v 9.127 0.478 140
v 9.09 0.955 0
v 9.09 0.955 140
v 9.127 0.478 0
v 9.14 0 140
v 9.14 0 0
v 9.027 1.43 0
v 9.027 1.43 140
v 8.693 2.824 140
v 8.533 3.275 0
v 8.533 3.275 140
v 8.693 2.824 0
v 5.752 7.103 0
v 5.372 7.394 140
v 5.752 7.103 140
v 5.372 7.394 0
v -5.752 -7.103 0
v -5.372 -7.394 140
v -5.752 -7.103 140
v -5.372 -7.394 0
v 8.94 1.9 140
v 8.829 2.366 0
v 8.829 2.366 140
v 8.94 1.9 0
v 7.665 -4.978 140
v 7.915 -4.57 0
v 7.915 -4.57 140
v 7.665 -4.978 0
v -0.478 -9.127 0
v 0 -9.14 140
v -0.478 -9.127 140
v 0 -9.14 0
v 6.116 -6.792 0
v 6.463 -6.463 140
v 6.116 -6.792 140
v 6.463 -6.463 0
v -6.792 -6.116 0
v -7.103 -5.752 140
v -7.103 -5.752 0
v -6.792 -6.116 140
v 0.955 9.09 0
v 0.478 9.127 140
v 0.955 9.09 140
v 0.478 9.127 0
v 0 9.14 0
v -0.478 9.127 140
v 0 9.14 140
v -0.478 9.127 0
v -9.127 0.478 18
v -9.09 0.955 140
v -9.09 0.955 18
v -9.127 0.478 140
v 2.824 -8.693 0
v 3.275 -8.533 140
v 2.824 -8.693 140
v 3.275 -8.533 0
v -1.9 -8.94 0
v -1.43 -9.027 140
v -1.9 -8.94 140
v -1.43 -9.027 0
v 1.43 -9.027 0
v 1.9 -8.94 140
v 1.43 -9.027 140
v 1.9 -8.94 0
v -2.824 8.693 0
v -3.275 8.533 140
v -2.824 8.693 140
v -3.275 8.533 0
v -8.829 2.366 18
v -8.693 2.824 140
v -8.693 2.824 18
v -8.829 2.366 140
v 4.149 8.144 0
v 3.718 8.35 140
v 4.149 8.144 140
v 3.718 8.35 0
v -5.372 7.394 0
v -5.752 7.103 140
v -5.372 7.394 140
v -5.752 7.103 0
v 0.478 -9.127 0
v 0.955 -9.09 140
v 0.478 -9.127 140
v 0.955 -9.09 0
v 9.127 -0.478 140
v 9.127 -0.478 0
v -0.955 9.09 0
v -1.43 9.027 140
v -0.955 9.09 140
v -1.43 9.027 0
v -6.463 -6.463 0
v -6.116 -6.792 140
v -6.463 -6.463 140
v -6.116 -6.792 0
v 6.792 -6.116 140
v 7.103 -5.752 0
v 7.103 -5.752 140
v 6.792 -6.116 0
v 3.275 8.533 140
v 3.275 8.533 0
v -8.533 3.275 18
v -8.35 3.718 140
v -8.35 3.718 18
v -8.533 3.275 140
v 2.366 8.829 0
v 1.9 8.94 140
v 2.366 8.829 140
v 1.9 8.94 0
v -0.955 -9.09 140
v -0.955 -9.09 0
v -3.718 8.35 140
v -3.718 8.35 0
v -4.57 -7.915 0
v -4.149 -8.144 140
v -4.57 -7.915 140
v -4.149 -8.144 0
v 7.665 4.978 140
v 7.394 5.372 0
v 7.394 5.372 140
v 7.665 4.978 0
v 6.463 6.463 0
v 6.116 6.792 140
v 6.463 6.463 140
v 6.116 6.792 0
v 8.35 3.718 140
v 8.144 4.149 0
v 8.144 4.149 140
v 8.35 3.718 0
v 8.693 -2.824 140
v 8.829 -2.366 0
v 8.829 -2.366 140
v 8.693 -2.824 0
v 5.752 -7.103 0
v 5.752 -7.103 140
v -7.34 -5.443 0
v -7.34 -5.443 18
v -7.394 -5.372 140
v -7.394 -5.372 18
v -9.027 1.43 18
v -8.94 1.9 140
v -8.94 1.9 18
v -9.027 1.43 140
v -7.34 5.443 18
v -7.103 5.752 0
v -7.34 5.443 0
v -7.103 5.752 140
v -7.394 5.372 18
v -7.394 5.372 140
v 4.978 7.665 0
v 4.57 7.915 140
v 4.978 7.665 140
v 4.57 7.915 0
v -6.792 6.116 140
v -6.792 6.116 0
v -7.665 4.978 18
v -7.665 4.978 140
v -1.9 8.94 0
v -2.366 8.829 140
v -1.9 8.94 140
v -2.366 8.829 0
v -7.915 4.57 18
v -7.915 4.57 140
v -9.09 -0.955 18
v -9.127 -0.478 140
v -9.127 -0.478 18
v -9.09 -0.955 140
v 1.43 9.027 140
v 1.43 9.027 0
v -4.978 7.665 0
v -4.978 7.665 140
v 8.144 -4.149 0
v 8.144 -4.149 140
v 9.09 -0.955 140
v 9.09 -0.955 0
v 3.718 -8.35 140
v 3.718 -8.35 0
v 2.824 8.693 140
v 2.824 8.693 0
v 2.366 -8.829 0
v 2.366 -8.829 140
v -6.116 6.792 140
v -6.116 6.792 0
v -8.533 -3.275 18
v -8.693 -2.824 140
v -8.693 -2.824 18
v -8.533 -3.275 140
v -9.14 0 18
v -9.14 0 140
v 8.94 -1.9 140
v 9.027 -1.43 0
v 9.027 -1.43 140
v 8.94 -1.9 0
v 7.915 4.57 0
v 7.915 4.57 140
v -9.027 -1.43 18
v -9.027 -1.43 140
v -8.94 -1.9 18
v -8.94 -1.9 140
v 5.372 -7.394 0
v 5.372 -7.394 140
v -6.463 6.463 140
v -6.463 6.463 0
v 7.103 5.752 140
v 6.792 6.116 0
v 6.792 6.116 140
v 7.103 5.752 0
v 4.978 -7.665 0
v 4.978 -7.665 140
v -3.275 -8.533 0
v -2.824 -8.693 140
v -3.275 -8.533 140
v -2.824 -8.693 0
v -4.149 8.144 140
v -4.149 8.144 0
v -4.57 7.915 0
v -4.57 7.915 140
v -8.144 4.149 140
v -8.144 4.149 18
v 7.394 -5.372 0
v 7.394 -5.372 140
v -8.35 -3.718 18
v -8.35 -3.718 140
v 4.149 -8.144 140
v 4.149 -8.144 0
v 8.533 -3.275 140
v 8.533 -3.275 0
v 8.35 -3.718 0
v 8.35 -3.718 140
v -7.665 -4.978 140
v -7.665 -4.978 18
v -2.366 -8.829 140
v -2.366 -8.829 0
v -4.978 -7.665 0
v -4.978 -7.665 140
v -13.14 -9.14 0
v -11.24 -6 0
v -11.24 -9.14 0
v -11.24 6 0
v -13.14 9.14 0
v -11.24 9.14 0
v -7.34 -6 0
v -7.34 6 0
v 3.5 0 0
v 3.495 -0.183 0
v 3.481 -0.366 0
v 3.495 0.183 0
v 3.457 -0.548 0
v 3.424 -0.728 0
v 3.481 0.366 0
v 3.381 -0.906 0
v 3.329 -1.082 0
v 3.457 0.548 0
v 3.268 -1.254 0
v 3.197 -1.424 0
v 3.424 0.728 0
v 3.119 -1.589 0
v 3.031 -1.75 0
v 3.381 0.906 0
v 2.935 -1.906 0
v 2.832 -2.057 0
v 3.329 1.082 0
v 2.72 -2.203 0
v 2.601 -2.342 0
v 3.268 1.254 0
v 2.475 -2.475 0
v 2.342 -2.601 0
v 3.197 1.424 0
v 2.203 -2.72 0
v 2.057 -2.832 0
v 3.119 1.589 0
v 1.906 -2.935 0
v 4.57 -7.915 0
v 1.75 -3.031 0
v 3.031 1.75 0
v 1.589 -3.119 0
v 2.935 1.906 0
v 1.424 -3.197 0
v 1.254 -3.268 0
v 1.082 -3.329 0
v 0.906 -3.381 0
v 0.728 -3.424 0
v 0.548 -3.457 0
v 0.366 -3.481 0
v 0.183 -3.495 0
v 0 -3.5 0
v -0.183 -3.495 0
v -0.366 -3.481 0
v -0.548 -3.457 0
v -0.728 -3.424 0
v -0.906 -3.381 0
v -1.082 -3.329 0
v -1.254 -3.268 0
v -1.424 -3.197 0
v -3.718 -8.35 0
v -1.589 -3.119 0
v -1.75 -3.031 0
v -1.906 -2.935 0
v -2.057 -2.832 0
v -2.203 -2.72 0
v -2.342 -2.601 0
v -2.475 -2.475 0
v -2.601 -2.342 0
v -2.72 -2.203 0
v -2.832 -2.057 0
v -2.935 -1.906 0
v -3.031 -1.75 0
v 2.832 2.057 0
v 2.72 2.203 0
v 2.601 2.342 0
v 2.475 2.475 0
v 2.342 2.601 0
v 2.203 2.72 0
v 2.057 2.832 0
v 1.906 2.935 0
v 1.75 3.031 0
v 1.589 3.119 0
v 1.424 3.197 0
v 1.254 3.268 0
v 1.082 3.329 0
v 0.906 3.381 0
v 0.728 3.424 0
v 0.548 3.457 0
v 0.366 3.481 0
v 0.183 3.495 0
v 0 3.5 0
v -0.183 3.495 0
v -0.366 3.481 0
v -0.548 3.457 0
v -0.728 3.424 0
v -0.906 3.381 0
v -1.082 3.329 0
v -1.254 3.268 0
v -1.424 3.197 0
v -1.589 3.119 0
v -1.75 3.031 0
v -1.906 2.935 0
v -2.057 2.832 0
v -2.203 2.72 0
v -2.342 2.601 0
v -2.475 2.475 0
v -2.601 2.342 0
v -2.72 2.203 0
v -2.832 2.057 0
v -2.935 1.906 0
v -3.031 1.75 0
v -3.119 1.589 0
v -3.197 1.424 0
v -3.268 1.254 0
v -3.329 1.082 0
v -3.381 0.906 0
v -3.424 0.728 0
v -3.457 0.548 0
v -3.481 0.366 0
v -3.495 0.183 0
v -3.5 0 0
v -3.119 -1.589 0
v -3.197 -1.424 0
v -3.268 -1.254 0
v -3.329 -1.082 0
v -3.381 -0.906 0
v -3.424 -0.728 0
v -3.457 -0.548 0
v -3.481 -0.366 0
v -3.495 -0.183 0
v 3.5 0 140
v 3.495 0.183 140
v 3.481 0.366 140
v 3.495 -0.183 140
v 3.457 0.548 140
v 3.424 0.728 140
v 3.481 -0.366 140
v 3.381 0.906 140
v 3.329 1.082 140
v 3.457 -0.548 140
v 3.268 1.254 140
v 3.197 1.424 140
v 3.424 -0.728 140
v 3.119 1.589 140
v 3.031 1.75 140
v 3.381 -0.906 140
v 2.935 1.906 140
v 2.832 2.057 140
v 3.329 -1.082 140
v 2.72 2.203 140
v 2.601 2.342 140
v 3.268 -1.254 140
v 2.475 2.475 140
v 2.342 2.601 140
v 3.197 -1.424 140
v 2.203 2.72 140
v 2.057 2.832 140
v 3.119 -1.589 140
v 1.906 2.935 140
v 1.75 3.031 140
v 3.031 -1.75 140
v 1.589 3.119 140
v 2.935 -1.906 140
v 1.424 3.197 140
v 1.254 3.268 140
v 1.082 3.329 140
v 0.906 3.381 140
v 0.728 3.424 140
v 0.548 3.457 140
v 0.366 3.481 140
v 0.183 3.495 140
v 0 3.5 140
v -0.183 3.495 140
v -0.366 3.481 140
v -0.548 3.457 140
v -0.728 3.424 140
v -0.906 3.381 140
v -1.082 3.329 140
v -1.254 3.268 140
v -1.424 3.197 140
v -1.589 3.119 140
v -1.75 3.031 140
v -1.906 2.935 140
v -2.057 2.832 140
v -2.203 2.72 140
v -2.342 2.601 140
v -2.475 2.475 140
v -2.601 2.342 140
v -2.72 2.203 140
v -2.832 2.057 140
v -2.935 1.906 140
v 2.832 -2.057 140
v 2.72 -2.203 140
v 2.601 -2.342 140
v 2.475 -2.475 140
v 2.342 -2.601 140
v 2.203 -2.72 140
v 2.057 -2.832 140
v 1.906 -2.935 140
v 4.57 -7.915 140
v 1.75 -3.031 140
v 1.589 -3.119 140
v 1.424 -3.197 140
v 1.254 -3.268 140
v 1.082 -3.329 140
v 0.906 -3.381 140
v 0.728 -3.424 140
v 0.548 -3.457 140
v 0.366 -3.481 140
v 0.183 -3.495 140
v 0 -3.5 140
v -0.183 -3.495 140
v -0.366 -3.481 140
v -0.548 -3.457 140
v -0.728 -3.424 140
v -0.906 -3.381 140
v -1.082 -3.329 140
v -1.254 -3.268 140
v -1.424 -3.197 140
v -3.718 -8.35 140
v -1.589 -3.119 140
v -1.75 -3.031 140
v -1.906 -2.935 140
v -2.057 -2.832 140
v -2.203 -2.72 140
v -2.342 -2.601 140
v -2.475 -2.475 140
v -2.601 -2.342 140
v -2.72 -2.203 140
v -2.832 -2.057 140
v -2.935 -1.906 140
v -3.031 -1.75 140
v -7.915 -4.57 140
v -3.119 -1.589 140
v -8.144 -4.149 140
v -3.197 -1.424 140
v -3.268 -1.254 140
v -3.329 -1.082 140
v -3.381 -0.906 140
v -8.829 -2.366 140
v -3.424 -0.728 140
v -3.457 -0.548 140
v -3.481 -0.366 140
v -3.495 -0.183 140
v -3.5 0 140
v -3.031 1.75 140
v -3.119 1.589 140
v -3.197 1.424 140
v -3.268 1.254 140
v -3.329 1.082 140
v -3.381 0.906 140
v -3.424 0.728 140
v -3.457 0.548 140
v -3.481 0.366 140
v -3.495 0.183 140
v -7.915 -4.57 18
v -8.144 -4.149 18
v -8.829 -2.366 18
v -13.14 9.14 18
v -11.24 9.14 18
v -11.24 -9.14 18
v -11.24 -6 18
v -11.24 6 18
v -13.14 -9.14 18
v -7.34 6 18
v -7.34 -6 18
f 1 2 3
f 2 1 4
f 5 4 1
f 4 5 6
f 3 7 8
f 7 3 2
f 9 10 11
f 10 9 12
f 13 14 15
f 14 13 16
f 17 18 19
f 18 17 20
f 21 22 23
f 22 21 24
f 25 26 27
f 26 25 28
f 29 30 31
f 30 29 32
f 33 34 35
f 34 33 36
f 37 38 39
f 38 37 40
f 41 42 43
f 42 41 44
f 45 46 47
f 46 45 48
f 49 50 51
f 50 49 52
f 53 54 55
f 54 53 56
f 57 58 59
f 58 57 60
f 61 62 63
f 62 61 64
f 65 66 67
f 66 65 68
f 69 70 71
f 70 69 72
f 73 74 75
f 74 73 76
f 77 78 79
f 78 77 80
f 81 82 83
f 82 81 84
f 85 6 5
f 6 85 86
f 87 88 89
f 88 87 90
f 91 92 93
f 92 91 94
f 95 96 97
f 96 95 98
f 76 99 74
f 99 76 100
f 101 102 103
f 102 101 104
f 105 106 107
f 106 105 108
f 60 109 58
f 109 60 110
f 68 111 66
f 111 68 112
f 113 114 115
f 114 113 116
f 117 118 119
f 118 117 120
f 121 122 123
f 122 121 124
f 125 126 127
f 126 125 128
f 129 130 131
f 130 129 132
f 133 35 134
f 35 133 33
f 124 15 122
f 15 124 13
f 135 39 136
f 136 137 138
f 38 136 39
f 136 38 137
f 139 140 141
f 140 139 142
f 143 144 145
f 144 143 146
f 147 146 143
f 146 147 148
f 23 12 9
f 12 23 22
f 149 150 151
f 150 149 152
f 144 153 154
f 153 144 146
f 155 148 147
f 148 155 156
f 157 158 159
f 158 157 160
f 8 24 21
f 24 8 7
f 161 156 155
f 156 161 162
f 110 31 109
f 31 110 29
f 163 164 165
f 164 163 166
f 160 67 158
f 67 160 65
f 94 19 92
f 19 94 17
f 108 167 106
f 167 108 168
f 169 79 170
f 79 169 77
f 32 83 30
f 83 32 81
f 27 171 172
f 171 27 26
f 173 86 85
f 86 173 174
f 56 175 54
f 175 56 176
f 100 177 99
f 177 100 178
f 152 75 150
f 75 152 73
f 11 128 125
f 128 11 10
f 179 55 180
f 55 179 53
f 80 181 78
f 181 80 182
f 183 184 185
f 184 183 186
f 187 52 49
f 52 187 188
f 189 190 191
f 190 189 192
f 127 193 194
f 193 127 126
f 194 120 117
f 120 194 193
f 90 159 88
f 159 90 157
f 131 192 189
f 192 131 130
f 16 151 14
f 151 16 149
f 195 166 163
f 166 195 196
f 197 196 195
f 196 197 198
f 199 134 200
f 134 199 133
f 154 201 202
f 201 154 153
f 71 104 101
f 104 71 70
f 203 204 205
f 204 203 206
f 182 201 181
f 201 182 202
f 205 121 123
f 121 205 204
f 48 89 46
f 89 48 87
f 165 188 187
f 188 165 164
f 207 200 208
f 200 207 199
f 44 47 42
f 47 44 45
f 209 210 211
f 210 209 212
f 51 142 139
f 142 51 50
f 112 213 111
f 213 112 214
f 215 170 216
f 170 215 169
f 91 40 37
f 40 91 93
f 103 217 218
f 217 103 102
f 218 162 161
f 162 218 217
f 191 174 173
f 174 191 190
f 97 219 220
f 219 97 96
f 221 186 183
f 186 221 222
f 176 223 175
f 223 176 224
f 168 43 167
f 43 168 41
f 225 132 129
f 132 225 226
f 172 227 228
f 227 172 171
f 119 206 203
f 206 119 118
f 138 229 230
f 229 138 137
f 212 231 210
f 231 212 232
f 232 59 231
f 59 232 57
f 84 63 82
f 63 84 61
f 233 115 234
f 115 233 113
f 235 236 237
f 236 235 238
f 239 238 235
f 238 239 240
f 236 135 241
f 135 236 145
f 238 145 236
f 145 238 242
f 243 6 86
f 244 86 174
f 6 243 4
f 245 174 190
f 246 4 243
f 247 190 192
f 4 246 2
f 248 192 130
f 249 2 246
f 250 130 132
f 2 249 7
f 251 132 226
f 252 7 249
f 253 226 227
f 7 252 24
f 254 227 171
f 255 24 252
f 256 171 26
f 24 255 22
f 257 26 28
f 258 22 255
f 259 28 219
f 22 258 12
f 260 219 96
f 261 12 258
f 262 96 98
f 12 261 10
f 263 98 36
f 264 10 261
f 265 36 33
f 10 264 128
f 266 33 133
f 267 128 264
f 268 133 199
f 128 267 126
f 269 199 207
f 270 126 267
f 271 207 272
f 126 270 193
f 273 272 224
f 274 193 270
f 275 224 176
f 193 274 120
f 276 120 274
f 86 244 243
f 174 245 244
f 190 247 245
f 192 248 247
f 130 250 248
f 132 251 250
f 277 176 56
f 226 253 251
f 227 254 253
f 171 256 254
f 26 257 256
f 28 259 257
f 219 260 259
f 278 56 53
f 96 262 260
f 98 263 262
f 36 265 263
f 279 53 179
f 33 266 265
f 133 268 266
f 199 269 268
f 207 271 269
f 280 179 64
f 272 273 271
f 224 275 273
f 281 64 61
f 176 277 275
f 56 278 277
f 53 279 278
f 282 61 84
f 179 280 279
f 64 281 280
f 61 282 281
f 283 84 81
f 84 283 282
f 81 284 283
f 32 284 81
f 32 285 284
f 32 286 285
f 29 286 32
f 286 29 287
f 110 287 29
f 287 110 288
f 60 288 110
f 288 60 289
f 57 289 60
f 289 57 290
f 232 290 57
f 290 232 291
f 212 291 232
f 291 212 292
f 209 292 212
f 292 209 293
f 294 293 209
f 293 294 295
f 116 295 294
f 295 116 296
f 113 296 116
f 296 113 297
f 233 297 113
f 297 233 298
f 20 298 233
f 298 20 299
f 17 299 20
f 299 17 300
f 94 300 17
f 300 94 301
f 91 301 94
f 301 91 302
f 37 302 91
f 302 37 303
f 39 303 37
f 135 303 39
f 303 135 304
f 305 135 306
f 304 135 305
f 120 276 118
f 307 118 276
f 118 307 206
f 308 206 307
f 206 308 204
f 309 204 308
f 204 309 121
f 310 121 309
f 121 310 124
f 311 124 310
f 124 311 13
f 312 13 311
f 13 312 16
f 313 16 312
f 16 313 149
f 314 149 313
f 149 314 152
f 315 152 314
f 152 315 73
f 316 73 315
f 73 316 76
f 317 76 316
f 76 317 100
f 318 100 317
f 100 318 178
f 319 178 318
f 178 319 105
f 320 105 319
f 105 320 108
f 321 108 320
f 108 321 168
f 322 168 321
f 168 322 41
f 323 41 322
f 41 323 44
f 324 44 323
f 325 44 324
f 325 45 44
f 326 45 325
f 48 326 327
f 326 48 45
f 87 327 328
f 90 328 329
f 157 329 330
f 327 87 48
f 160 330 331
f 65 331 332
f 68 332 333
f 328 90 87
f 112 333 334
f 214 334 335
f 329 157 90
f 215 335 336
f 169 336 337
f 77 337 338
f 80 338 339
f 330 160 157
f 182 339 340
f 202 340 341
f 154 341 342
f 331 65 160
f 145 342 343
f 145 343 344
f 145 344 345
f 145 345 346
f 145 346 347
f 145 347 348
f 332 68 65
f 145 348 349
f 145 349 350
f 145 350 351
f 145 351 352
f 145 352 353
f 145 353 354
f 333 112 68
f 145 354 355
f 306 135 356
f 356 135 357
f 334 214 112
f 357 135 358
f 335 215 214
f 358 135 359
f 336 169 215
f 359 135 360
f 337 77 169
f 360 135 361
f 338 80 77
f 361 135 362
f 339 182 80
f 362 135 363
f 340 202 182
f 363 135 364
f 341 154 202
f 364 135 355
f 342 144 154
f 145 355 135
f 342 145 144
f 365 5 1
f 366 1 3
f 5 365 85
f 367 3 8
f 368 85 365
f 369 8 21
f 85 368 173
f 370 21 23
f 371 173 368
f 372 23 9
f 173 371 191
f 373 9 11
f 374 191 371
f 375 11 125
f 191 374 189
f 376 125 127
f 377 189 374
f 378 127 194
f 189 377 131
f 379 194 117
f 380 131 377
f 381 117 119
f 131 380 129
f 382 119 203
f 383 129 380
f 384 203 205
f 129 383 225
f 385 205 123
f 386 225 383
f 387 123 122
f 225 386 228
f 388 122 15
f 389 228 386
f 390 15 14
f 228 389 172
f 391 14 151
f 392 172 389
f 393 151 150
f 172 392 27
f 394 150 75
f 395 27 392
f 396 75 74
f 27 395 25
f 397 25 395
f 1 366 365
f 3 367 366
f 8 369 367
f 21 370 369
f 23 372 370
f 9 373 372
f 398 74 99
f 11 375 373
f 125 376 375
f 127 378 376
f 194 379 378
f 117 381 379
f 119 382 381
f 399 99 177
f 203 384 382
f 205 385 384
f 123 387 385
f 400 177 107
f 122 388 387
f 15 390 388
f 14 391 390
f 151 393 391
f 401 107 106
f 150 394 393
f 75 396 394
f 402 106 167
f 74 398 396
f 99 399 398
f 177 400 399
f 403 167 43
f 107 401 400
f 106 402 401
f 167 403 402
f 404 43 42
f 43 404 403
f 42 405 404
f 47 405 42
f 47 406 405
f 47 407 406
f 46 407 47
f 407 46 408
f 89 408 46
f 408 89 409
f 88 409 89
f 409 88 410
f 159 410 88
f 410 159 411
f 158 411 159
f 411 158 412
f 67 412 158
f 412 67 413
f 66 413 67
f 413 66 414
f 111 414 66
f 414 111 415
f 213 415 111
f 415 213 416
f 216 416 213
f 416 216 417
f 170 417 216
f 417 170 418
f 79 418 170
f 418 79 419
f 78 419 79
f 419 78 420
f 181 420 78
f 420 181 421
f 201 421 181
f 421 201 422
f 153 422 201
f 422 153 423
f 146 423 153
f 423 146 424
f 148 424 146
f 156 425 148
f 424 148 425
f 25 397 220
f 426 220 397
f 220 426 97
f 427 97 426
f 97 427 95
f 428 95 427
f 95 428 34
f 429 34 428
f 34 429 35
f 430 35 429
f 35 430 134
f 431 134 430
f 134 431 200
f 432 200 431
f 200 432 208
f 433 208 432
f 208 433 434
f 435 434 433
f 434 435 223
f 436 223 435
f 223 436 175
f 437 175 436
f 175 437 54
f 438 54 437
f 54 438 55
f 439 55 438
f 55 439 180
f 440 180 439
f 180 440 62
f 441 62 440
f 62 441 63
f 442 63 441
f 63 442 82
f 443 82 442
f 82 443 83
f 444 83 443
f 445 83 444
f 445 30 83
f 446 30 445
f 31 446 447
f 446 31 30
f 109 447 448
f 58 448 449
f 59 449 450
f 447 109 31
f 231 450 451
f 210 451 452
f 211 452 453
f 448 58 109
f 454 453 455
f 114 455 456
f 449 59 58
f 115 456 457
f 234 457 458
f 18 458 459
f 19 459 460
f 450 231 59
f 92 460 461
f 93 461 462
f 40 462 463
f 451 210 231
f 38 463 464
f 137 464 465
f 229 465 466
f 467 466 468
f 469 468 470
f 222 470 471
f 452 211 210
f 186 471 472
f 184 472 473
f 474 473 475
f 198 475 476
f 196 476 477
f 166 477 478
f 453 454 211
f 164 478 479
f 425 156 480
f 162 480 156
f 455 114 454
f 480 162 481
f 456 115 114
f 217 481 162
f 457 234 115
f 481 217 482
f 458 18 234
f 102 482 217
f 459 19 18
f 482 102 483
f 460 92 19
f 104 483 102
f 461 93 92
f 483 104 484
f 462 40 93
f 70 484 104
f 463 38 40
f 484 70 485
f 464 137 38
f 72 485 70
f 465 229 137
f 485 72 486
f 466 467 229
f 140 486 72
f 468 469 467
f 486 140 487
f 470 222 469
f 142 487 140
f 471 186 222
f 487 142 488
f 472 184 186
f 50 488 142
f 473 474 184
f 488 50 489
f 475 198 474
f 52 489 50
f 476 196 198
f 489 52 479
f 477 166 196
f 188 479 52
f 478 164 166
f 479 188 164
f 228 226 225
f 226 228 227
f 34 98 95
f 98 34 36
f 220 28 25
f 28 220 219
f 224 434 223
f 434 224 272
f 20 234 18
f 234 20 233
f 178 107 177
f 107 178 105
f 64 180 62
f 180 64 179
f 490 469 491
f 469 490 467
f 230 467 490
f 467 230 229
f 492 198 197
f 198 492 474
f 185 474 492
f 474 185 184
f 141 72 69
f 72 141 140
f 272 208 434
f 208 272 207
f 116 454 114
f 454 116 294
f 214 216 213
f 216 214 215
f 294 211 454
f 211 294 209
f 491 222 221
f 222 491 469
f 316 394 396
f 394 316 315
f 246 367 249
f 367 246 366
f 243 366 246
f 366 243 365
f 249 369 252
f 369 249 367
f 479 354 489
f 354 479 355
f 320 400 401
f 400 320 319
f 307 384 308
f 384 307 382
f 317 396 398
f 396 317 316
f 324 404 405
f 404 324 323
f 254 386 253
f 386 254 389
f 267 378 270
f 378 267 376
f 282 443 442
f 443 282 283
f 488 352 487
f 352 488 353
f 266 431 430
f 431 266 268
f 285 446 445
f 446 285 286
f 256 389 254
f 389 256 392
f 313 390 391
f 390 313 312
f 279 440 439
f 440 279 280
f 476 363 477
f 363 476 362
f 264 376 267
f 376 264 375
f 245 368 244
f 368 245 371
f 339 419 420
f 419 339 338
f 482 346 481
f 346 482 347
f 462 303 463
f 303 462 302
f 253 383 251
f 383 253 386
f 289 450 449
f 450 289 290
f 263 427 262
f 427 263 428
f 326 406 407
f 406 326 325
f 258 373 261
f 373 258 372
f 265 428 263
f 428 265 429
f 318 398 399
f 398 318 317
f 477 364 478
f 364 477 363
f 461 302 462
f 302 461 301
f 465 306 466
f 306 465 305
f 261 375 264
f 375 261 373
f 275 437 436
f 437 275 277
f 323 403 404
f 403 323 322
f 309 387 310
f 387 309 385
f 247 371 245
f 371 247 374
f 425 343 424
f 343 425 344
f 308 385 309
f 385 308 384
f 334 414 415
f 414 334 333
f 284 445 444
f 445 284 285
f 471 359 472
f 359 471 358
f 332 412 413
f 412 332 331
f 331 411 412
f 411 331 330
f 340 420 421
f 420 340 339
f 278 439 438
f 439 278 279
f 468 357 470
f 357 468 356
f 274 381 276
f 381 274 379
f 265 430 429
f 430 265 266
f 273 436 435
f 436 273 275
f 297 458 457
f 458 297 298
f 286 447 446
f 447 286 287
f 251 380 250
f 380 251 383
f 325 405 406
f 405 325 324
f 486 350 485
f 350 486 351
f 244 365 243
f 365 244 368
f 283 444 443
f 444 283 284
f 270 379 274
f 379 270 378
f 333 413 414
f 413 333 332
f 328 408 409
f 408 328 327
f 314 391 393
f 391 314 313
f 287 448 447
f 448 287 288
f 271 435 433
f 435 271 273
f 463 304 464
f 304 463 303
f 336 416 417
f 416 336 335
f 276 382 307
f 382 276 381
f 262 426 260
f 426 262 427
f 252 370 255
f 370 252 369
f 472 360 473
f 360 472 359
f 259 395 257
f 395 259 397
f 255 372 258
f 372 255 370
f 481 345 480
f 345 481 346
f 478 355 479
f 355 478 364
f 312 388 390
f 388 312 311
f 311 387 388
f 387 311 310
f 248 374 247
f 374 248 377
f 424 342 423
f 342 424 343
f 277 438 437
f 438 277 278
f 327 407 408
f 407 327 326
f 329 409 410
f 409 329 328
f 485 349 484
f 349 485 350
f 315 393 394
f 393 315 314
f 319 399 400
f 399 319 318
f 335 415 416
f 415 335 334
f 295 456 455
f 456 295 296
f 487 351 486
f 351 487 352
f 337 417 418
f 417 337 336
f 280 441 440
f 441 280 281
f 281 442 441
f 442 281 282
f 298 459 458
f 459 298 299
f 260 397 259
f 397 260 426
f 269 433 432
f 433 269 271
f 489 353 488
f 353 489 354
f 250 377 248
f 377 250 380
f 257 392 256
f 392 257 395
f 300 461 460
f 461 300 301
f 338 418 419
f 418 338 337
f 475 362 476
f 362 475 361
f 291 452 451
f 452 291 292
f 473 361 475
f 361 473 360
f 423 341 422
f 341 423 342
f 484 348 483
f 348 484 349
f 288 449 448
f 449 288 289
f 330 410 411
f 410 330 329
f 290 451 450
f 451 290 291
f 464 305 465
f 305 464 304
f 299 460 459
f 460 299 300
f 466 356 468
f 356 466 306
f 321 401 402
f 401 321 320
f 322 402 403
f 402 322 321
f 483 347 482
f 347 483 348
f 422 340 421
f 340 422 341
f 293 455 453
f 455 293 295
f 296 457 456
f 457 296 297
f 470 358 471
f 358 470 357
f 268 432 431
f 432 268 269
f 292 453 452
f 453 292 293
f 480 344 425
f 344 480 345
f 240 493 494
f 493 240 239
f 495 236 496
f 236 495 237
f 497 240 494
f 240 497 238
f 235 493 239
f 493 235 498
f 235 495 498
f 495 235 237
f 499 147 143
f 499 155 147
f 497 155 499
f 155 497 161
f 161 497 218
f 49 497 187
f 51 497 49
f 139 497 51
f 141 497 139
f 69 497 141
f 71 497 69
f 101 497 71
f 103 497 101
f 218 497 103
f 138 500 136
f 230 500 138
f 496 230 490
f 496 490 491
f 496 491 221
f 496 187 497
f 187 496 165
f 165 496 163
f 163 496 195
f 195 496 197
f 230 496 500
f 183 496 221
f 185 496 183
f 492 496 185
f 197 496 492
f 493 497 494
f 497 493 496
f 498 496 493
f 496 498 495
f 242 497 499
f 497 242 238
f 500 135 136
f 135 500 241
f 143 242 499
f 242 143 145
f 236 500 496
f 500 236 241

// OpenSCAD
// file: myTools.scad
module tube (r = 0, d = 0, l = 0, 
            thick = 0, 
            bCentered = true, 
            taper_pct = 0, 
            circlip = false) // r=radius d=dia l=length 
{
    assert( r != 0 || d != 0, "specify one of radius or diameter");
    assert( l != 0 , "tube: need length 'l' to be non zero");
    assert( thick != 0, "wall thickness cannot be zero");

    punch = $preview ? .2 : 0; // stop funny view artifact

    dia = r ? r * 2 : d;

    od = ((thick > 0) ? dia + thick * 2 : dia);
    id = (thick > 0) ? dia             : dia  + thick *2; 

    
    
    if (thick > 0)
        echo ("tube\tMIN id = ", id, "od = ", od, "wall = ", thick, "center= ", bCentered);
    else
        echo ("tube\tMAX od = ", od, "id = ", id, "wall = ", thick, "center= ", bCentered);

    echo ("tube\tHeigth = ", l);
        
    if (taper_pct != 0)
    {
        echo ("tube\t*** OD expanded by ", taper_pct, "%, : bottom od = ", od * (1. +taper_pct/100), "top od = ", od);
    }
    
    assert(dia || dia < 0, "tube : missing r or d ");
    
    // if taper_pct specified, the base will always be closest to 0,0,0
    translate([ 0, 0, taper_pct == 0 ? 0: bCentered ? l/2:l  ])
    rotate([0, taper_pct == 0 ? 0 : 180, 0 ])

    difference()
    {
        // make a reese's cup
        {
            color("YELLOW", .3)
            linear_extrude(height= l, scale = 1 + taper_pct/100)
                difference()
                {
                    circle(d = od);
                    circle(d = .5);
                }
        }
    
     // hollow out reessed cup
     color("GREEN")
     translate([0, 0, -punch/2])
     linear_extrude(height= l+ punch*2, $fn=100)
     {
        circle(d = id);
        if (circlip) #square([1 + punch, od ]);
     }
    
    }
}
//==============================================================================
        
module abox (dims, 
            thick = 0, 
            bCentered = true, 
            round_out = 0, 
            round_in = 0, 
            bSolid = false,
            bHollow = false,
            elevator = 0)   // move bottom up by X
{
    punch = $preview ? .1 : 0; // stop funny view artifact
    
    assert(thick != 0, "Thick must be specified. +=outside dim, -= inside dims");
    assert(dims.z > thick, "wall thickness too large for depth of box");

    wall2 = abs(thick) * 2; // 2 walls in each direction
    wall = wall2 / 2;
    
    // box either grows inward (thick < 0) or outward (thick > 0)  from dims
    fat = dims + [ wall2, wall2, wall];
    thin = dims - [ wall2, wall2, wall];
    
    offset = (thick > 0 && bCentered == false) ? wall : 0;
    
    //echo ("abox : adjusting x,y,z by ", offset, " to move origin from  center to 0,0,0");
    translate( [ bCentered ? 0 : dims.x /2 + offset, bCentered ? 0 : dims.y /2 + offset, bCentered ? 0 : dims.z /2 + offset/2]) 
    {
        if (thick > 0)
        {   
            // wall grows outwards from users dim
            echo ("making a box, MAX INSIDE dim = ", dims, "a wall=", thick, "mm ... max outside = ", fat, " mm");
        }
        else
        {
            // wall grows inward from users dime
            echo ("making a box, MAX OUTSIDE dim = ", dims, "a wall=", thick, "mm ... min inside = ", thin, " mm");
        }
        
        // linear extrude alway works in the positive x/y plane an goes upward.
        // after calc, re-center about 0,0,0 where a bCentered cube would be
        
        translate([ 0, 0, thick > 0  ? -fat.z/2 : -dims.z/2 ])
        difference()
        {
            echo ("round_out = ", round_out);

            // MAKE SOLID BOX --------------------------------------
            router_outside = round_out ? round_out : 0;
            x = thick > 0  ? fat.x - router_outside : dims.x - router_outside;
            y = thick > 0  ? fat.y - router_outside : dims.y - router_outside;


            // MAKE PUCHNED INSIDE
            // using 'offset' it will add r on all dimensions, then round., 
            // so now you have fatter perimeter than you started with :(
            //  but at least the corners are round.
            
            // Compensate by shrinking dimension by r, 
            // and then by calling offset, offset will then add it back

            color("YELLOW", .2)

            linear_extrude(thick > 0  ? fat.z : dims.z)
            if (round_out)
            {
                offset( r= round_out, $fn=30)
                square( [x - router_outside, y - router_outside], true);
            }
            else square( [x - router_outside, y - router_outside], true);
           
            // time to punch out the inside if requested.
            if (bSolid == false)
            {
                hollow_offset = bHollow ? fat.z/2 + .2  : dims.z/2 +.2;
                // punching out inside. its either dims or thin.
                router_inside = round_in;
                echo ("round_in = ", router_inside);
                xi = thick > 0  ? dims.x  : thin.x;
                yi = thick > 0  ? dims.y : thin.y ;

                color("GREEN")

                // move 'punch' up if you need a bottom else zero (hollowed out)

                translate([ 0,0, bHollow ? -.1 : wall + elevator]) 
                linear_extrude(thick > 0  ? fat.z - wall  + hollow_offset : dims.z - wall + hollow_offset)
                //#linear_extrude(fat.z - wall  + hollow_offset)
                
                if (round_in) 
                {
                    offset( r= round_in, $fn=30)
                    square( [ xi - router_inside, yi - router_inside], true);
                }
                else
                    square( [ xi, yi], true);
            }
        }
    }
 }


// 50x25x10 box walls grow inward (-2). on center origin midpoint
// rounded outside (default), sharp corner inside(default), bCentered about 0,0,0
//color("GREEN", .9)
//abox([50,25, 10], -2, true); 


// 50x25x10 box walls grow inward (-2). on center origin midpoint
// sharp outside corners, rounded inside corners. Sit on x,y plane
color("BLUE", .9)
abox([50,20, 10], +2, round_in=2, bCentered = false);  // 50x25x10 box inside dim origin has 0,0


// 50x25x10 box walls grow inward (-2). on center origin midpoint
// sharp corners inside and out. sits on x,y plane
color("GREY", .9)//
translate([ 55, 0, 0])      
abox([50,20, 10], +2, round_out=3, false);

color("PINK", .9)//
translate([ 115, 10, 10])      
abox([86.66, 56.865, 5], -5, bHollow = true, bCentered = false); 

color("GREEN", .9)//
translate([ 140, 10, -10])      
abox([86.66, 56.865, 5], 3, bHollow = true, bCentered = false); 

/*
// 50x25x10 box walls grow inward (-2). on center origin midpoint
// round corners outside and SOLID
color("BLUE", .9)//
translate([ 55, 0, 0])      
abox([50,25, 10], +2, round_out=2, round_in=0, false, bSolid = true); // 50x25x10 box outside dim origin is 0,0
*/

//translate ([-30,-30, 0])
{
/*
    // tube outer dia  20, inner dia = (20 - 8)
    color("PINK")
    tube (d = 20, l = 20, thick = -8, bCentered = false);

    // tube, inner dia = (2* 10), outer dia = ((2*10) + 2) 
    color("PURPLE", .3)
    tube (r = 10, l = 20, thick = +2, bCentered= true);
*/
/*
    tube (d = 60, l = 20, thick = -6, bCentered = false);

    translate([0, 0, 50])
    tube (d = 60, l = 20, thick = -6, bCentered = false, taper_pct = 20, circlip = true);
    //color("GREEN")
    //tube (d = 20, l = 20, thick = -2, bCentered = false, taper = 10, circlip = true);
*/

}
// main file
//use <otherPeoplesWork/threads-scad/threads.scad>
use <myTools.scad>

/* [Hidden] */


TWEAK=.25;
WALL = 2;

x = 18.28;  // camera mount.
y = 18;     // camera mount
z = 1.9 ;  // camera mount.   
long = 140;  // arbitrary

$fn=120;   //circle quantize 360/10=36 degrees per side

// make sight
Wave_insideDIM = [ x, y, z ];


// make pedestal
rotate([90, 0, 90])
translate([-x/2, 0, -x/2 -4 ])
{
    #cube(Wave_insideDIM, center = false);
}

// make a stump between pedestal and sight
rotate([90, 0, 90])
translate([-6, 0, -x/2 - 2.2 ])
{
    #cube([12,18, 4], center = false);
}


difference()
{
    cylinder(h = long,d = x);
    cylinder(h = long, d = 7);
}
